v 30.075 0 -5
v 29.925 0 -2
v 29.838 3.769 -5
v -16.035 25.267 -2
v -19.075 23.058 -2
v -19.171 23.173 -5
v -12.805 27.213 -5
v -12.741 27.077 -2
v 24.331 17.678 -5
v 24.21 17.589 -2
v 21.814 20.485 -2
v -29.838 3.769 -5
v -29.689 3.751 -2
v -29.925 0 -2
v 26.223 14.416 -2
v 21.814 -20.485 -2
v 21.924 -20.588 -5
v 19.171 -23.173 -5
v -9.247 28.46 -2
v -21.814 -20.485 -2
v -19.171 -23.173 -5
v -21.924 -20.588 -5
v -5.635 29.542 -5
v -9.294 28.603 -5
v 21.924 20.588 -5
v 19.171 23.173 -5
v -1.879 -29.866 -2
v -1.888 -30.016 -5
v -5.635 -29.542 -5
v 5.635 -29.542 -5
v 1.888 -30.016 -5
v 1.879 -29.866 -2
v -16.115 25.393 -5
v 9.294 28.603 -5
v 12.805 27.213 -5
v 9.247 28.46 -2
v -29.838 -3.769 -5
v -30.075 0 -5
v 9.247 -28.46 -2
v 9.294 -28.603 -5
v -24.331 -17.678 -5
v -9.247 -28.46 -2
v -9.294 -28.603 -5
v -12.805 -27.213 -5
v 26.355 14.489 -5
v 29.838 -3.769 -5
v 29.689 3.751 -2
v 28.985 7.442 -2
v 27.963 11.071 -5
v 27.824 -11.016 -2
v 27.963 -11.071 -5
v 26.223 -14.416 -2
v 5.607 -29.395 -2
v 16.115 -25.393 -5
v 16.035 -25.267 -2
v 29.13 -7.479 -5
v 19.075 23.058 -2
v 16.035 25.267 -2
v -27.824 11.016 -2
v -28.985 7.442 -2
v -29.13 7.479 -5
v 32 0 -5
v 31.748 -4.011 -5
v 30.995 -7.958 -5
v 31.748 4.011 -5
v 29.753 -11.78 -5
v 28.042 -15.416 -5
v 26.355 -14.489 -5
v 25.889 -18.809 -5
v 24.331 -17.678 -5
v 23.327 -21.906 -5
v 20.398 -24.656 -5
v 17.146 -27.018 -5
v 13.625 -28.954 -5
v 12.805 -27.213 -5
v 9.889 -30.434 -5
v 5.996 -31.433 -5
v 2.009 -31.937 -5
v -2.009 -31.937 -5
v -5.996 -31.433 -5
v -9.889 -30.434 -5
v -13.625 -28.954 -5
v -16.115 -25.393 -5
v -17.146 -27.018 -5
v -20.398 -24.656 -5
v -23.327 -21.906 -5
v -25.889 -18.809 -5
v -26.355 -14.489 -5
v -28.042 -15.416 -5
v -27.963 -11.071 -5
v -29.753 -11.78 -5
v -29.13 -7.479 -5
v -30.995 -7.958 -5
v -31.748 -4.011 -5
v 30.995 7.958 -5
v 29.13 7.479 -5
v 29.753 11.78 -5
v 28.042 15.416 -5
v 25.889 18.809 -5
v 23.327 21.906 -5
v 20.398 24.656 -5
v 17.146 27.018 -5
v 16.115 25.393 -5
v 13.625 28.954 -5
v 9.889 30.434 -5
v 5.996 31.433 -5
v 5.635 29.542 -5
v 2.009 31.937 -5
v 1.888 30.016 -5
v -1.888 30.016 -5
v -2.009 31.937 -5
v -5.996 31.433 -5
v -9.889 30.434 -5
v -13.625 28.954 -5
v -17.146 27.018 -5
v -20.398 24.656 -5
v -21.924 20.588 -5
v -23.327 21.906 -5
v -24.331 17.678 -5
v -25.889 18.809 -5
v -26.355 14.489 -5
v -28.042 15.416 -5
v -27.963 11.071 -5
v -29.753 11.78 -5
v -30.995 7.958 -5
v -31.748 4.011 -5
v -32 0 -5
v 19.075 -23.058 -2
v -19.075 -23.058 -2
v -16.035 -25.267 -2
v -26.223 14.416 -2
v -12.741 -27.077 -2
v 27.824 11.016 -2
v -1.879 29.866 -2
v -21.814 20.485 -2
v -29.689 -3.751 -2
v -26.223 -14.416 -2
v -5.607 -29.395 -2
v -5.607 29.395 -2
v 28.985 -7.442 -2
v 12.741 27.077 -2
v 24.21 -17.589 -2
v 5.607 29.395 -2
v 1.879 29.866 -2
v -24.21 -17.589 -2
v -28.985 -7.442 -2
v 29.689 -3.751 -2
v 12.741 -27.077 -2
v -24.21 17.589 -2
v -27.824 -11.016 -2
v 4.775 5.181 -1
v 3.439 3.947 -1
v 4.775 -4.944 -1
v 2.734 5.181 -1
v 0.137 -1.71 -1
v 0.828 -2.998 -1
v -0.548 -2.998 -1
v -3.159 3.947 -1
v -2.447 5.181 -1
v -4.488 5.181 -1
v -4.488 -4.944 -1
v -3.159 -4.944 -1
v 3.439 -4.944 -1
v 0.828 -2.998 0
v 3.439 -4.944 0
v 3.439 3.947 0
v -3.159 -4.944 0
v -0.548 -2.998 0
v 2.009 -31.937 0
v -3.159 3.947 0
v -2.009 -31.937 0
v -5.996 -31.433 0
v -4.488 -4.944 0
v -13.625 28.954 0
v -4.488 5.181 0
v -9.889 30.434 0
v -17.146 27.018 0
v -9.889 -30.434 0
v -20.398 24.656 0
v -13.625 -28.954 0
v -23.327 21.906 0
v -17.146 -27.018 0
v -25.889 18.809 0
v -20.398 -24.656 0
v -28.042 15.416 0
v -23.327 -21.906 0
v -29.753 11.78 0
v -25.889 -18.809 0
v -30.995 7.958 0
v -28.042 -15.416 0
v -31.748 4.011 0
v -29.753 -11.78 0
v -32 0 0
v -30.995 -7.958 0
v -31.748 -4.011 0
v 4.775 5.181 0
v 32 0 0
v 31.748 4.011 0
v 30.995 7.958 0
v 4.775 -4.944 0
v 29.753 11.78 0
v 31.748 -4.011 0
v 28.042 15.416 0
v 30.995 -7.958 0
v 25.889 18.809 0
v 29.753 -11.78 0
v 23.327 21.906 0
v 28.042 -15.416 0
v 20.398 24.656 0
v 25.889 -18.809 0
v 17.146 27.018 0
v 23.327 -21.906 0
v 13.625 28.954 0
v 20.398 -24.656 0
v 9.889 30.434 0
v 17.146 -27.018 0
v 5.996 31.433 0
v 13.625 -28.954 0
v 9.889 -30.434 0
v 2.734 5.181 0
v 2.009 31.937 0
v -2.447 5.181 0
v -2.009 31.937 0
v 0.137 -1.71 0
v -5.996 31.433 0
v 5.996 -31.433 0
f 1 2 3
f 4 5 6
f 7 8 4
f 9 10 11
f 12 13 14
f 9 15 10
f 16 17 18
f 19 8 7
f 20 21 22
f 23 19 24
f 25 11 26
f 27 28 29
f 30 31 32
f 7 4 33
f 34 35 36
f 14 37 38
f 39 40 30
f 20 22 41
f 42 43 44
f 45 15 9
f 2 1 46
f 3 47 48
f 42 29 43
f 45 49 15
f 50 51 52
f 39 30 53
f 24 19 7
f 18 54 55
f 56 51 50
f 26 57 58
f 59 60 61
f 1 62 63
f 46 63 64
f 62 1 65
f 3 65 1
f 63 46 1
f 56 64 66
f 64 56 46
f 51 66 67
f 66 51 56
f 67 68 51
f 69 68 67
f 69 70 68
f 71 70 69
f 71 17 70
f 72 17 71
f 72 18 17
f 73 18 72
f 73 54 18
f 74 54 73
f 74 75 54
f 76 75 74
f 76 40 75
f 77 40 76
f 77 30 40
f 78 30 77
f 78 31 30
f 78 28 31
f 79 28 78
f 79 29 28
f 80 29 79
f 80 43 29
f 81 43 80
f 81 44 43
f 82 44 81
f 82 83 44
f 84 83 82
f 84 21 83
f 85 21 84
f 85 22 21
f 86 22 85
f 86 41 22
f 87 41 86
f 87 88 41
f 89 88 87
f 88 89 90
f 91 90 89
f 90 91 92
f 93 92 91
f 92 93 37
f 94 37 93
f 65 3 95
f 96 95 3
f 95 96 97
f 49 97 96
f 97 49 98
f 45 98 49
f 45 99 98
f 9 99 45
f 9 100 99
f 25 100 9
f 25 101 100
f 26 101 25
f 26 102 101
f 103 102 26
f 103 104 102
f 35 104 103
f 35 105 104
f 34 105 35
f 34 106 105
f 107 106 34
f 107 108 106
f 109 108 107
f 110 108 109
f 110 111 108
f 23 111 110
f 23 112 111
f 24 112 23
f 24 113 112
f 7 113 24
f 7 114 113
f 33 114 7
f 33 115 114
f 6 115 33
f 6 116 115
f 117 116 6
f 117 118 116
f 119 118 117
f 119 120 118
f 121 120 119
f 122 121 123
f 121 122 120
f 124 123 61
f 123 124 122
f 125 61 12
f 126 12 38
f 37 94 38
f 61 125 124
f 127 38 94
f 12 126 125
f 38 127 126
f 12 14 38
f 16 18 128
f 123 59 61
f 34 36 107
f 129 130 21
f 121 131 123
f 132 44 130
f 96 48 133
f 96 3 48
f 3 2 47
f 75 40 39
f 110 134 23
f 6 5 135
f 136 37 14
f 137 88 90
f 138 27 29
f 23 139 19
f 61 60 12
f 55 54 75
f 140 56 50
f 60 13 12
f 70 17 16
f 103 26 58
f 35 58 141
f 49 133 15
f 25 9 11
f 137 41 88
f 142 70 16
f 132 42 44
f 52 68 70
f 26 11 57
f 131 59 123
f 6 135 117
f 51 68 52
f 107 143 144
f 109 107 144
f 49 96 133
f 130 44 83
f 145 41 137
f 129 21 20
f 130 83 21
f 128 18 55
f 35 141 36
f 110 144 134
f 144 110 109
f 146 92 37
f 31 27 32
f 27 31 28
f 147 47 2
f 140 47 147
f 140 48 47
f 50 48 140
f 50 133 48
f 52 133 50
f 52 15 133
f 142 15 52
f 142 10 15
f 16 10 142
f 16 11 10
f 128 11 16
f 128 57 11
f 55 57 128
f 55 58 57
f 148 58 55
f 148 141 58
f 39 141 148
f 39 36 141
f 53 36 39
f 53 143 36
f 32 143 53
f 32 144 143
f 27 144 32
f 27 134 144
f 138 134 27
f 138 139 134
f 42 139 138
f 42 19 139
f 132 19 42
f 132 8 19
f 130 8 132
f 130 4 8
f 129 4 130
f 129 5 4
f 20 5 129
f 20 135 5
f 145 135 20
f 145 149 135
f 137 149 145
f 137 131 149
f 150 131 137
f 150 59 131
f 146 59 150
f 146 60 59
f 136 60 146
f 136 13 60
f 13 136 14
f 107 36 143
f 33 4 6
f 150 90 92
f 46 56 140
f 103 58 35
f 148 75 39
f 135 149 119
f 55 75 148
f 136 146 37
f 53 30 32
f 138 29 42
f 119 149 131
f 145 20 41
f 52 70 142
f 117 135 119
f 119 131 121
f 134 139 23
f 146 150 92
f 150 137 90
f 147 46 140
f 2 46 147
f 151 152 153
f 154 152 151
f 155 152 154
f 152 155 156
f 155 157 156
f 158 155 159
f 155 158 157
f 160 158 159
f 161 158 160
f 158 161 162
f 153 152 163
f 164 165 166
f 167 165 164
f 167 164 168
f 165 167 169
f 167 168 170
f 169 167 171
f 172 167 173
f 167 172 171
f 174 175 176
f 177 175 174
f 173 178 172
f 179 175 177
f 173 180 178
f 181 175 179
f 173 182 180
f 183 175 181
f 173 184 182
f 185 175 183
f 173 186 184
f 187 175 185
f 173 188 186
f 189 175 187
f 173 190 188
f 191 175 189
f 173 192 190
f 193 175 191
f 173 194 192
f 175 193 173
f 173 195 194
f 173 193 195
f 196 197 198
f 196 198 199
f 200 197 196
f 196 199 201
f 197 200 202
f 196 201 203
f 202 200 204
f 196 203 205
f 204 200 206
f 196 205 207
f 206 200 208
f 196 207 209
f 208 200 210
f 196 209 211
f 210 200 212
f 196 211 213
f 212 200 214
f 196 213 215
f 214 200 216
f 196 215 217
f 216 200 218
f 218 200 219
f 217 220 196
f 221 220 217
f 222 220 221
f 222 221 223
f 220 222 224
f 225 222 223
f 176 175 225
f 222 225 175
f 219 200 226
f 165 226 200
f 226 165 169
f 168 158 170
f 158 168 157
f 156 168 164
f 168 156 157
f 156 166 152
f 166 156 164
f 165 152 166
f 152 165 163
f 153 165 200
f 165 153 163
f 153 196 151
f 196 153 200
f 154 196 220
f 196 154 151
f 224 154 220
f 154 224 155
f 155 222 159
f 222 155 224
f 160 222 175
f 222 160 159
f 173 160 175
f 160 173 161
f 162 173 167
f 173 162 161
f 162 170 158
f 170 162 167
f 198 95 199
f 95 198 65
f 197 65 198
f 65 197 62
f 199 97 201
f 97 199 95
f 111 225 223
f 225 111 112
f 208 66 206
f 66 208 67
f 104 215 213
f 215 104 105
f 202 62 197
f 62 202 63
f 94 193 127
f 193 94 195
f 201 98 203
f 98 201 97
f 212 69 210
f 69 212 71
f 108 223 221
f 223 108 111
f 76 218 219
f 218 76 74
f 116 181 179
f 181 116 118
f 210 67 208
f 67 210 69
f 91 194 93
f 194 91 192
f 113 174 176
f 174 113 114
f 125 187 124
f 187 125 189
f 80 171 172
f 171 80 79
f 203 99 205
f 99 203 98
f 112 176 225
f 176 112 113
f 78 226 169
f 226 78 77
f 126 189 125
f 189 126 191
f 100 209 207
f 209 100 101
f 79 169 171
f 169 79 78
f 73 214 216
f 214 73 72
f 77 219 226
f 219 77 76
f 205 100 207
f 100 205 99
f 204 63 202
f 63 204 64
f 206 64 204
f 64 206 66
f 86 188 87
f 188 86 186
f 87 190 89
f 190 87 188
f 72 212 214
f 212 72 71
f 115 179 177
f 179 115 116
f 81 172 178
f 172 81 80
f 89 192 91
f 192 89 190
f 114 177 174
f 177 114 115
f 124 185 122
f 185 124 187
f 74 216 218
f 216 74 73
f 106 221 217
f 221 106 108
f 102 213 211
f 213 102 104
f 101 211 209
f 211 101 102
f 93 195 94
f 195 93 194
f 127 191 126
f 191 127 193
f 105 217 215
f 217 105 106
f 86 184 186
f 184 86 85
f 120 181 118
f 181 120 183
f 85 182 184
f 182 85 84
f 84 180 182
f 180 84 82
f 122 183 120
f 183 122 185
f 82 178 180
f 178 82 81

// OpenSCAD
$fn = 50;

difference() {
	union() {
		translate(v = [0, 0, -5.0]) {
			cylinder(h = 5, r = 32.0);
		}
	}
	union() {
		#translate(v = [0, 0, -5.0]) {
			cylinder(h = 3, r1 = 30.075, r2 = 29.925);
		}
		translate(v = [0, 0, -1]) {
			linear_extrude(height = 1) {
				text(font = "Impact", halign = "center", size = 10, text = "M", valign = "center");
			}
		}
	}
}
